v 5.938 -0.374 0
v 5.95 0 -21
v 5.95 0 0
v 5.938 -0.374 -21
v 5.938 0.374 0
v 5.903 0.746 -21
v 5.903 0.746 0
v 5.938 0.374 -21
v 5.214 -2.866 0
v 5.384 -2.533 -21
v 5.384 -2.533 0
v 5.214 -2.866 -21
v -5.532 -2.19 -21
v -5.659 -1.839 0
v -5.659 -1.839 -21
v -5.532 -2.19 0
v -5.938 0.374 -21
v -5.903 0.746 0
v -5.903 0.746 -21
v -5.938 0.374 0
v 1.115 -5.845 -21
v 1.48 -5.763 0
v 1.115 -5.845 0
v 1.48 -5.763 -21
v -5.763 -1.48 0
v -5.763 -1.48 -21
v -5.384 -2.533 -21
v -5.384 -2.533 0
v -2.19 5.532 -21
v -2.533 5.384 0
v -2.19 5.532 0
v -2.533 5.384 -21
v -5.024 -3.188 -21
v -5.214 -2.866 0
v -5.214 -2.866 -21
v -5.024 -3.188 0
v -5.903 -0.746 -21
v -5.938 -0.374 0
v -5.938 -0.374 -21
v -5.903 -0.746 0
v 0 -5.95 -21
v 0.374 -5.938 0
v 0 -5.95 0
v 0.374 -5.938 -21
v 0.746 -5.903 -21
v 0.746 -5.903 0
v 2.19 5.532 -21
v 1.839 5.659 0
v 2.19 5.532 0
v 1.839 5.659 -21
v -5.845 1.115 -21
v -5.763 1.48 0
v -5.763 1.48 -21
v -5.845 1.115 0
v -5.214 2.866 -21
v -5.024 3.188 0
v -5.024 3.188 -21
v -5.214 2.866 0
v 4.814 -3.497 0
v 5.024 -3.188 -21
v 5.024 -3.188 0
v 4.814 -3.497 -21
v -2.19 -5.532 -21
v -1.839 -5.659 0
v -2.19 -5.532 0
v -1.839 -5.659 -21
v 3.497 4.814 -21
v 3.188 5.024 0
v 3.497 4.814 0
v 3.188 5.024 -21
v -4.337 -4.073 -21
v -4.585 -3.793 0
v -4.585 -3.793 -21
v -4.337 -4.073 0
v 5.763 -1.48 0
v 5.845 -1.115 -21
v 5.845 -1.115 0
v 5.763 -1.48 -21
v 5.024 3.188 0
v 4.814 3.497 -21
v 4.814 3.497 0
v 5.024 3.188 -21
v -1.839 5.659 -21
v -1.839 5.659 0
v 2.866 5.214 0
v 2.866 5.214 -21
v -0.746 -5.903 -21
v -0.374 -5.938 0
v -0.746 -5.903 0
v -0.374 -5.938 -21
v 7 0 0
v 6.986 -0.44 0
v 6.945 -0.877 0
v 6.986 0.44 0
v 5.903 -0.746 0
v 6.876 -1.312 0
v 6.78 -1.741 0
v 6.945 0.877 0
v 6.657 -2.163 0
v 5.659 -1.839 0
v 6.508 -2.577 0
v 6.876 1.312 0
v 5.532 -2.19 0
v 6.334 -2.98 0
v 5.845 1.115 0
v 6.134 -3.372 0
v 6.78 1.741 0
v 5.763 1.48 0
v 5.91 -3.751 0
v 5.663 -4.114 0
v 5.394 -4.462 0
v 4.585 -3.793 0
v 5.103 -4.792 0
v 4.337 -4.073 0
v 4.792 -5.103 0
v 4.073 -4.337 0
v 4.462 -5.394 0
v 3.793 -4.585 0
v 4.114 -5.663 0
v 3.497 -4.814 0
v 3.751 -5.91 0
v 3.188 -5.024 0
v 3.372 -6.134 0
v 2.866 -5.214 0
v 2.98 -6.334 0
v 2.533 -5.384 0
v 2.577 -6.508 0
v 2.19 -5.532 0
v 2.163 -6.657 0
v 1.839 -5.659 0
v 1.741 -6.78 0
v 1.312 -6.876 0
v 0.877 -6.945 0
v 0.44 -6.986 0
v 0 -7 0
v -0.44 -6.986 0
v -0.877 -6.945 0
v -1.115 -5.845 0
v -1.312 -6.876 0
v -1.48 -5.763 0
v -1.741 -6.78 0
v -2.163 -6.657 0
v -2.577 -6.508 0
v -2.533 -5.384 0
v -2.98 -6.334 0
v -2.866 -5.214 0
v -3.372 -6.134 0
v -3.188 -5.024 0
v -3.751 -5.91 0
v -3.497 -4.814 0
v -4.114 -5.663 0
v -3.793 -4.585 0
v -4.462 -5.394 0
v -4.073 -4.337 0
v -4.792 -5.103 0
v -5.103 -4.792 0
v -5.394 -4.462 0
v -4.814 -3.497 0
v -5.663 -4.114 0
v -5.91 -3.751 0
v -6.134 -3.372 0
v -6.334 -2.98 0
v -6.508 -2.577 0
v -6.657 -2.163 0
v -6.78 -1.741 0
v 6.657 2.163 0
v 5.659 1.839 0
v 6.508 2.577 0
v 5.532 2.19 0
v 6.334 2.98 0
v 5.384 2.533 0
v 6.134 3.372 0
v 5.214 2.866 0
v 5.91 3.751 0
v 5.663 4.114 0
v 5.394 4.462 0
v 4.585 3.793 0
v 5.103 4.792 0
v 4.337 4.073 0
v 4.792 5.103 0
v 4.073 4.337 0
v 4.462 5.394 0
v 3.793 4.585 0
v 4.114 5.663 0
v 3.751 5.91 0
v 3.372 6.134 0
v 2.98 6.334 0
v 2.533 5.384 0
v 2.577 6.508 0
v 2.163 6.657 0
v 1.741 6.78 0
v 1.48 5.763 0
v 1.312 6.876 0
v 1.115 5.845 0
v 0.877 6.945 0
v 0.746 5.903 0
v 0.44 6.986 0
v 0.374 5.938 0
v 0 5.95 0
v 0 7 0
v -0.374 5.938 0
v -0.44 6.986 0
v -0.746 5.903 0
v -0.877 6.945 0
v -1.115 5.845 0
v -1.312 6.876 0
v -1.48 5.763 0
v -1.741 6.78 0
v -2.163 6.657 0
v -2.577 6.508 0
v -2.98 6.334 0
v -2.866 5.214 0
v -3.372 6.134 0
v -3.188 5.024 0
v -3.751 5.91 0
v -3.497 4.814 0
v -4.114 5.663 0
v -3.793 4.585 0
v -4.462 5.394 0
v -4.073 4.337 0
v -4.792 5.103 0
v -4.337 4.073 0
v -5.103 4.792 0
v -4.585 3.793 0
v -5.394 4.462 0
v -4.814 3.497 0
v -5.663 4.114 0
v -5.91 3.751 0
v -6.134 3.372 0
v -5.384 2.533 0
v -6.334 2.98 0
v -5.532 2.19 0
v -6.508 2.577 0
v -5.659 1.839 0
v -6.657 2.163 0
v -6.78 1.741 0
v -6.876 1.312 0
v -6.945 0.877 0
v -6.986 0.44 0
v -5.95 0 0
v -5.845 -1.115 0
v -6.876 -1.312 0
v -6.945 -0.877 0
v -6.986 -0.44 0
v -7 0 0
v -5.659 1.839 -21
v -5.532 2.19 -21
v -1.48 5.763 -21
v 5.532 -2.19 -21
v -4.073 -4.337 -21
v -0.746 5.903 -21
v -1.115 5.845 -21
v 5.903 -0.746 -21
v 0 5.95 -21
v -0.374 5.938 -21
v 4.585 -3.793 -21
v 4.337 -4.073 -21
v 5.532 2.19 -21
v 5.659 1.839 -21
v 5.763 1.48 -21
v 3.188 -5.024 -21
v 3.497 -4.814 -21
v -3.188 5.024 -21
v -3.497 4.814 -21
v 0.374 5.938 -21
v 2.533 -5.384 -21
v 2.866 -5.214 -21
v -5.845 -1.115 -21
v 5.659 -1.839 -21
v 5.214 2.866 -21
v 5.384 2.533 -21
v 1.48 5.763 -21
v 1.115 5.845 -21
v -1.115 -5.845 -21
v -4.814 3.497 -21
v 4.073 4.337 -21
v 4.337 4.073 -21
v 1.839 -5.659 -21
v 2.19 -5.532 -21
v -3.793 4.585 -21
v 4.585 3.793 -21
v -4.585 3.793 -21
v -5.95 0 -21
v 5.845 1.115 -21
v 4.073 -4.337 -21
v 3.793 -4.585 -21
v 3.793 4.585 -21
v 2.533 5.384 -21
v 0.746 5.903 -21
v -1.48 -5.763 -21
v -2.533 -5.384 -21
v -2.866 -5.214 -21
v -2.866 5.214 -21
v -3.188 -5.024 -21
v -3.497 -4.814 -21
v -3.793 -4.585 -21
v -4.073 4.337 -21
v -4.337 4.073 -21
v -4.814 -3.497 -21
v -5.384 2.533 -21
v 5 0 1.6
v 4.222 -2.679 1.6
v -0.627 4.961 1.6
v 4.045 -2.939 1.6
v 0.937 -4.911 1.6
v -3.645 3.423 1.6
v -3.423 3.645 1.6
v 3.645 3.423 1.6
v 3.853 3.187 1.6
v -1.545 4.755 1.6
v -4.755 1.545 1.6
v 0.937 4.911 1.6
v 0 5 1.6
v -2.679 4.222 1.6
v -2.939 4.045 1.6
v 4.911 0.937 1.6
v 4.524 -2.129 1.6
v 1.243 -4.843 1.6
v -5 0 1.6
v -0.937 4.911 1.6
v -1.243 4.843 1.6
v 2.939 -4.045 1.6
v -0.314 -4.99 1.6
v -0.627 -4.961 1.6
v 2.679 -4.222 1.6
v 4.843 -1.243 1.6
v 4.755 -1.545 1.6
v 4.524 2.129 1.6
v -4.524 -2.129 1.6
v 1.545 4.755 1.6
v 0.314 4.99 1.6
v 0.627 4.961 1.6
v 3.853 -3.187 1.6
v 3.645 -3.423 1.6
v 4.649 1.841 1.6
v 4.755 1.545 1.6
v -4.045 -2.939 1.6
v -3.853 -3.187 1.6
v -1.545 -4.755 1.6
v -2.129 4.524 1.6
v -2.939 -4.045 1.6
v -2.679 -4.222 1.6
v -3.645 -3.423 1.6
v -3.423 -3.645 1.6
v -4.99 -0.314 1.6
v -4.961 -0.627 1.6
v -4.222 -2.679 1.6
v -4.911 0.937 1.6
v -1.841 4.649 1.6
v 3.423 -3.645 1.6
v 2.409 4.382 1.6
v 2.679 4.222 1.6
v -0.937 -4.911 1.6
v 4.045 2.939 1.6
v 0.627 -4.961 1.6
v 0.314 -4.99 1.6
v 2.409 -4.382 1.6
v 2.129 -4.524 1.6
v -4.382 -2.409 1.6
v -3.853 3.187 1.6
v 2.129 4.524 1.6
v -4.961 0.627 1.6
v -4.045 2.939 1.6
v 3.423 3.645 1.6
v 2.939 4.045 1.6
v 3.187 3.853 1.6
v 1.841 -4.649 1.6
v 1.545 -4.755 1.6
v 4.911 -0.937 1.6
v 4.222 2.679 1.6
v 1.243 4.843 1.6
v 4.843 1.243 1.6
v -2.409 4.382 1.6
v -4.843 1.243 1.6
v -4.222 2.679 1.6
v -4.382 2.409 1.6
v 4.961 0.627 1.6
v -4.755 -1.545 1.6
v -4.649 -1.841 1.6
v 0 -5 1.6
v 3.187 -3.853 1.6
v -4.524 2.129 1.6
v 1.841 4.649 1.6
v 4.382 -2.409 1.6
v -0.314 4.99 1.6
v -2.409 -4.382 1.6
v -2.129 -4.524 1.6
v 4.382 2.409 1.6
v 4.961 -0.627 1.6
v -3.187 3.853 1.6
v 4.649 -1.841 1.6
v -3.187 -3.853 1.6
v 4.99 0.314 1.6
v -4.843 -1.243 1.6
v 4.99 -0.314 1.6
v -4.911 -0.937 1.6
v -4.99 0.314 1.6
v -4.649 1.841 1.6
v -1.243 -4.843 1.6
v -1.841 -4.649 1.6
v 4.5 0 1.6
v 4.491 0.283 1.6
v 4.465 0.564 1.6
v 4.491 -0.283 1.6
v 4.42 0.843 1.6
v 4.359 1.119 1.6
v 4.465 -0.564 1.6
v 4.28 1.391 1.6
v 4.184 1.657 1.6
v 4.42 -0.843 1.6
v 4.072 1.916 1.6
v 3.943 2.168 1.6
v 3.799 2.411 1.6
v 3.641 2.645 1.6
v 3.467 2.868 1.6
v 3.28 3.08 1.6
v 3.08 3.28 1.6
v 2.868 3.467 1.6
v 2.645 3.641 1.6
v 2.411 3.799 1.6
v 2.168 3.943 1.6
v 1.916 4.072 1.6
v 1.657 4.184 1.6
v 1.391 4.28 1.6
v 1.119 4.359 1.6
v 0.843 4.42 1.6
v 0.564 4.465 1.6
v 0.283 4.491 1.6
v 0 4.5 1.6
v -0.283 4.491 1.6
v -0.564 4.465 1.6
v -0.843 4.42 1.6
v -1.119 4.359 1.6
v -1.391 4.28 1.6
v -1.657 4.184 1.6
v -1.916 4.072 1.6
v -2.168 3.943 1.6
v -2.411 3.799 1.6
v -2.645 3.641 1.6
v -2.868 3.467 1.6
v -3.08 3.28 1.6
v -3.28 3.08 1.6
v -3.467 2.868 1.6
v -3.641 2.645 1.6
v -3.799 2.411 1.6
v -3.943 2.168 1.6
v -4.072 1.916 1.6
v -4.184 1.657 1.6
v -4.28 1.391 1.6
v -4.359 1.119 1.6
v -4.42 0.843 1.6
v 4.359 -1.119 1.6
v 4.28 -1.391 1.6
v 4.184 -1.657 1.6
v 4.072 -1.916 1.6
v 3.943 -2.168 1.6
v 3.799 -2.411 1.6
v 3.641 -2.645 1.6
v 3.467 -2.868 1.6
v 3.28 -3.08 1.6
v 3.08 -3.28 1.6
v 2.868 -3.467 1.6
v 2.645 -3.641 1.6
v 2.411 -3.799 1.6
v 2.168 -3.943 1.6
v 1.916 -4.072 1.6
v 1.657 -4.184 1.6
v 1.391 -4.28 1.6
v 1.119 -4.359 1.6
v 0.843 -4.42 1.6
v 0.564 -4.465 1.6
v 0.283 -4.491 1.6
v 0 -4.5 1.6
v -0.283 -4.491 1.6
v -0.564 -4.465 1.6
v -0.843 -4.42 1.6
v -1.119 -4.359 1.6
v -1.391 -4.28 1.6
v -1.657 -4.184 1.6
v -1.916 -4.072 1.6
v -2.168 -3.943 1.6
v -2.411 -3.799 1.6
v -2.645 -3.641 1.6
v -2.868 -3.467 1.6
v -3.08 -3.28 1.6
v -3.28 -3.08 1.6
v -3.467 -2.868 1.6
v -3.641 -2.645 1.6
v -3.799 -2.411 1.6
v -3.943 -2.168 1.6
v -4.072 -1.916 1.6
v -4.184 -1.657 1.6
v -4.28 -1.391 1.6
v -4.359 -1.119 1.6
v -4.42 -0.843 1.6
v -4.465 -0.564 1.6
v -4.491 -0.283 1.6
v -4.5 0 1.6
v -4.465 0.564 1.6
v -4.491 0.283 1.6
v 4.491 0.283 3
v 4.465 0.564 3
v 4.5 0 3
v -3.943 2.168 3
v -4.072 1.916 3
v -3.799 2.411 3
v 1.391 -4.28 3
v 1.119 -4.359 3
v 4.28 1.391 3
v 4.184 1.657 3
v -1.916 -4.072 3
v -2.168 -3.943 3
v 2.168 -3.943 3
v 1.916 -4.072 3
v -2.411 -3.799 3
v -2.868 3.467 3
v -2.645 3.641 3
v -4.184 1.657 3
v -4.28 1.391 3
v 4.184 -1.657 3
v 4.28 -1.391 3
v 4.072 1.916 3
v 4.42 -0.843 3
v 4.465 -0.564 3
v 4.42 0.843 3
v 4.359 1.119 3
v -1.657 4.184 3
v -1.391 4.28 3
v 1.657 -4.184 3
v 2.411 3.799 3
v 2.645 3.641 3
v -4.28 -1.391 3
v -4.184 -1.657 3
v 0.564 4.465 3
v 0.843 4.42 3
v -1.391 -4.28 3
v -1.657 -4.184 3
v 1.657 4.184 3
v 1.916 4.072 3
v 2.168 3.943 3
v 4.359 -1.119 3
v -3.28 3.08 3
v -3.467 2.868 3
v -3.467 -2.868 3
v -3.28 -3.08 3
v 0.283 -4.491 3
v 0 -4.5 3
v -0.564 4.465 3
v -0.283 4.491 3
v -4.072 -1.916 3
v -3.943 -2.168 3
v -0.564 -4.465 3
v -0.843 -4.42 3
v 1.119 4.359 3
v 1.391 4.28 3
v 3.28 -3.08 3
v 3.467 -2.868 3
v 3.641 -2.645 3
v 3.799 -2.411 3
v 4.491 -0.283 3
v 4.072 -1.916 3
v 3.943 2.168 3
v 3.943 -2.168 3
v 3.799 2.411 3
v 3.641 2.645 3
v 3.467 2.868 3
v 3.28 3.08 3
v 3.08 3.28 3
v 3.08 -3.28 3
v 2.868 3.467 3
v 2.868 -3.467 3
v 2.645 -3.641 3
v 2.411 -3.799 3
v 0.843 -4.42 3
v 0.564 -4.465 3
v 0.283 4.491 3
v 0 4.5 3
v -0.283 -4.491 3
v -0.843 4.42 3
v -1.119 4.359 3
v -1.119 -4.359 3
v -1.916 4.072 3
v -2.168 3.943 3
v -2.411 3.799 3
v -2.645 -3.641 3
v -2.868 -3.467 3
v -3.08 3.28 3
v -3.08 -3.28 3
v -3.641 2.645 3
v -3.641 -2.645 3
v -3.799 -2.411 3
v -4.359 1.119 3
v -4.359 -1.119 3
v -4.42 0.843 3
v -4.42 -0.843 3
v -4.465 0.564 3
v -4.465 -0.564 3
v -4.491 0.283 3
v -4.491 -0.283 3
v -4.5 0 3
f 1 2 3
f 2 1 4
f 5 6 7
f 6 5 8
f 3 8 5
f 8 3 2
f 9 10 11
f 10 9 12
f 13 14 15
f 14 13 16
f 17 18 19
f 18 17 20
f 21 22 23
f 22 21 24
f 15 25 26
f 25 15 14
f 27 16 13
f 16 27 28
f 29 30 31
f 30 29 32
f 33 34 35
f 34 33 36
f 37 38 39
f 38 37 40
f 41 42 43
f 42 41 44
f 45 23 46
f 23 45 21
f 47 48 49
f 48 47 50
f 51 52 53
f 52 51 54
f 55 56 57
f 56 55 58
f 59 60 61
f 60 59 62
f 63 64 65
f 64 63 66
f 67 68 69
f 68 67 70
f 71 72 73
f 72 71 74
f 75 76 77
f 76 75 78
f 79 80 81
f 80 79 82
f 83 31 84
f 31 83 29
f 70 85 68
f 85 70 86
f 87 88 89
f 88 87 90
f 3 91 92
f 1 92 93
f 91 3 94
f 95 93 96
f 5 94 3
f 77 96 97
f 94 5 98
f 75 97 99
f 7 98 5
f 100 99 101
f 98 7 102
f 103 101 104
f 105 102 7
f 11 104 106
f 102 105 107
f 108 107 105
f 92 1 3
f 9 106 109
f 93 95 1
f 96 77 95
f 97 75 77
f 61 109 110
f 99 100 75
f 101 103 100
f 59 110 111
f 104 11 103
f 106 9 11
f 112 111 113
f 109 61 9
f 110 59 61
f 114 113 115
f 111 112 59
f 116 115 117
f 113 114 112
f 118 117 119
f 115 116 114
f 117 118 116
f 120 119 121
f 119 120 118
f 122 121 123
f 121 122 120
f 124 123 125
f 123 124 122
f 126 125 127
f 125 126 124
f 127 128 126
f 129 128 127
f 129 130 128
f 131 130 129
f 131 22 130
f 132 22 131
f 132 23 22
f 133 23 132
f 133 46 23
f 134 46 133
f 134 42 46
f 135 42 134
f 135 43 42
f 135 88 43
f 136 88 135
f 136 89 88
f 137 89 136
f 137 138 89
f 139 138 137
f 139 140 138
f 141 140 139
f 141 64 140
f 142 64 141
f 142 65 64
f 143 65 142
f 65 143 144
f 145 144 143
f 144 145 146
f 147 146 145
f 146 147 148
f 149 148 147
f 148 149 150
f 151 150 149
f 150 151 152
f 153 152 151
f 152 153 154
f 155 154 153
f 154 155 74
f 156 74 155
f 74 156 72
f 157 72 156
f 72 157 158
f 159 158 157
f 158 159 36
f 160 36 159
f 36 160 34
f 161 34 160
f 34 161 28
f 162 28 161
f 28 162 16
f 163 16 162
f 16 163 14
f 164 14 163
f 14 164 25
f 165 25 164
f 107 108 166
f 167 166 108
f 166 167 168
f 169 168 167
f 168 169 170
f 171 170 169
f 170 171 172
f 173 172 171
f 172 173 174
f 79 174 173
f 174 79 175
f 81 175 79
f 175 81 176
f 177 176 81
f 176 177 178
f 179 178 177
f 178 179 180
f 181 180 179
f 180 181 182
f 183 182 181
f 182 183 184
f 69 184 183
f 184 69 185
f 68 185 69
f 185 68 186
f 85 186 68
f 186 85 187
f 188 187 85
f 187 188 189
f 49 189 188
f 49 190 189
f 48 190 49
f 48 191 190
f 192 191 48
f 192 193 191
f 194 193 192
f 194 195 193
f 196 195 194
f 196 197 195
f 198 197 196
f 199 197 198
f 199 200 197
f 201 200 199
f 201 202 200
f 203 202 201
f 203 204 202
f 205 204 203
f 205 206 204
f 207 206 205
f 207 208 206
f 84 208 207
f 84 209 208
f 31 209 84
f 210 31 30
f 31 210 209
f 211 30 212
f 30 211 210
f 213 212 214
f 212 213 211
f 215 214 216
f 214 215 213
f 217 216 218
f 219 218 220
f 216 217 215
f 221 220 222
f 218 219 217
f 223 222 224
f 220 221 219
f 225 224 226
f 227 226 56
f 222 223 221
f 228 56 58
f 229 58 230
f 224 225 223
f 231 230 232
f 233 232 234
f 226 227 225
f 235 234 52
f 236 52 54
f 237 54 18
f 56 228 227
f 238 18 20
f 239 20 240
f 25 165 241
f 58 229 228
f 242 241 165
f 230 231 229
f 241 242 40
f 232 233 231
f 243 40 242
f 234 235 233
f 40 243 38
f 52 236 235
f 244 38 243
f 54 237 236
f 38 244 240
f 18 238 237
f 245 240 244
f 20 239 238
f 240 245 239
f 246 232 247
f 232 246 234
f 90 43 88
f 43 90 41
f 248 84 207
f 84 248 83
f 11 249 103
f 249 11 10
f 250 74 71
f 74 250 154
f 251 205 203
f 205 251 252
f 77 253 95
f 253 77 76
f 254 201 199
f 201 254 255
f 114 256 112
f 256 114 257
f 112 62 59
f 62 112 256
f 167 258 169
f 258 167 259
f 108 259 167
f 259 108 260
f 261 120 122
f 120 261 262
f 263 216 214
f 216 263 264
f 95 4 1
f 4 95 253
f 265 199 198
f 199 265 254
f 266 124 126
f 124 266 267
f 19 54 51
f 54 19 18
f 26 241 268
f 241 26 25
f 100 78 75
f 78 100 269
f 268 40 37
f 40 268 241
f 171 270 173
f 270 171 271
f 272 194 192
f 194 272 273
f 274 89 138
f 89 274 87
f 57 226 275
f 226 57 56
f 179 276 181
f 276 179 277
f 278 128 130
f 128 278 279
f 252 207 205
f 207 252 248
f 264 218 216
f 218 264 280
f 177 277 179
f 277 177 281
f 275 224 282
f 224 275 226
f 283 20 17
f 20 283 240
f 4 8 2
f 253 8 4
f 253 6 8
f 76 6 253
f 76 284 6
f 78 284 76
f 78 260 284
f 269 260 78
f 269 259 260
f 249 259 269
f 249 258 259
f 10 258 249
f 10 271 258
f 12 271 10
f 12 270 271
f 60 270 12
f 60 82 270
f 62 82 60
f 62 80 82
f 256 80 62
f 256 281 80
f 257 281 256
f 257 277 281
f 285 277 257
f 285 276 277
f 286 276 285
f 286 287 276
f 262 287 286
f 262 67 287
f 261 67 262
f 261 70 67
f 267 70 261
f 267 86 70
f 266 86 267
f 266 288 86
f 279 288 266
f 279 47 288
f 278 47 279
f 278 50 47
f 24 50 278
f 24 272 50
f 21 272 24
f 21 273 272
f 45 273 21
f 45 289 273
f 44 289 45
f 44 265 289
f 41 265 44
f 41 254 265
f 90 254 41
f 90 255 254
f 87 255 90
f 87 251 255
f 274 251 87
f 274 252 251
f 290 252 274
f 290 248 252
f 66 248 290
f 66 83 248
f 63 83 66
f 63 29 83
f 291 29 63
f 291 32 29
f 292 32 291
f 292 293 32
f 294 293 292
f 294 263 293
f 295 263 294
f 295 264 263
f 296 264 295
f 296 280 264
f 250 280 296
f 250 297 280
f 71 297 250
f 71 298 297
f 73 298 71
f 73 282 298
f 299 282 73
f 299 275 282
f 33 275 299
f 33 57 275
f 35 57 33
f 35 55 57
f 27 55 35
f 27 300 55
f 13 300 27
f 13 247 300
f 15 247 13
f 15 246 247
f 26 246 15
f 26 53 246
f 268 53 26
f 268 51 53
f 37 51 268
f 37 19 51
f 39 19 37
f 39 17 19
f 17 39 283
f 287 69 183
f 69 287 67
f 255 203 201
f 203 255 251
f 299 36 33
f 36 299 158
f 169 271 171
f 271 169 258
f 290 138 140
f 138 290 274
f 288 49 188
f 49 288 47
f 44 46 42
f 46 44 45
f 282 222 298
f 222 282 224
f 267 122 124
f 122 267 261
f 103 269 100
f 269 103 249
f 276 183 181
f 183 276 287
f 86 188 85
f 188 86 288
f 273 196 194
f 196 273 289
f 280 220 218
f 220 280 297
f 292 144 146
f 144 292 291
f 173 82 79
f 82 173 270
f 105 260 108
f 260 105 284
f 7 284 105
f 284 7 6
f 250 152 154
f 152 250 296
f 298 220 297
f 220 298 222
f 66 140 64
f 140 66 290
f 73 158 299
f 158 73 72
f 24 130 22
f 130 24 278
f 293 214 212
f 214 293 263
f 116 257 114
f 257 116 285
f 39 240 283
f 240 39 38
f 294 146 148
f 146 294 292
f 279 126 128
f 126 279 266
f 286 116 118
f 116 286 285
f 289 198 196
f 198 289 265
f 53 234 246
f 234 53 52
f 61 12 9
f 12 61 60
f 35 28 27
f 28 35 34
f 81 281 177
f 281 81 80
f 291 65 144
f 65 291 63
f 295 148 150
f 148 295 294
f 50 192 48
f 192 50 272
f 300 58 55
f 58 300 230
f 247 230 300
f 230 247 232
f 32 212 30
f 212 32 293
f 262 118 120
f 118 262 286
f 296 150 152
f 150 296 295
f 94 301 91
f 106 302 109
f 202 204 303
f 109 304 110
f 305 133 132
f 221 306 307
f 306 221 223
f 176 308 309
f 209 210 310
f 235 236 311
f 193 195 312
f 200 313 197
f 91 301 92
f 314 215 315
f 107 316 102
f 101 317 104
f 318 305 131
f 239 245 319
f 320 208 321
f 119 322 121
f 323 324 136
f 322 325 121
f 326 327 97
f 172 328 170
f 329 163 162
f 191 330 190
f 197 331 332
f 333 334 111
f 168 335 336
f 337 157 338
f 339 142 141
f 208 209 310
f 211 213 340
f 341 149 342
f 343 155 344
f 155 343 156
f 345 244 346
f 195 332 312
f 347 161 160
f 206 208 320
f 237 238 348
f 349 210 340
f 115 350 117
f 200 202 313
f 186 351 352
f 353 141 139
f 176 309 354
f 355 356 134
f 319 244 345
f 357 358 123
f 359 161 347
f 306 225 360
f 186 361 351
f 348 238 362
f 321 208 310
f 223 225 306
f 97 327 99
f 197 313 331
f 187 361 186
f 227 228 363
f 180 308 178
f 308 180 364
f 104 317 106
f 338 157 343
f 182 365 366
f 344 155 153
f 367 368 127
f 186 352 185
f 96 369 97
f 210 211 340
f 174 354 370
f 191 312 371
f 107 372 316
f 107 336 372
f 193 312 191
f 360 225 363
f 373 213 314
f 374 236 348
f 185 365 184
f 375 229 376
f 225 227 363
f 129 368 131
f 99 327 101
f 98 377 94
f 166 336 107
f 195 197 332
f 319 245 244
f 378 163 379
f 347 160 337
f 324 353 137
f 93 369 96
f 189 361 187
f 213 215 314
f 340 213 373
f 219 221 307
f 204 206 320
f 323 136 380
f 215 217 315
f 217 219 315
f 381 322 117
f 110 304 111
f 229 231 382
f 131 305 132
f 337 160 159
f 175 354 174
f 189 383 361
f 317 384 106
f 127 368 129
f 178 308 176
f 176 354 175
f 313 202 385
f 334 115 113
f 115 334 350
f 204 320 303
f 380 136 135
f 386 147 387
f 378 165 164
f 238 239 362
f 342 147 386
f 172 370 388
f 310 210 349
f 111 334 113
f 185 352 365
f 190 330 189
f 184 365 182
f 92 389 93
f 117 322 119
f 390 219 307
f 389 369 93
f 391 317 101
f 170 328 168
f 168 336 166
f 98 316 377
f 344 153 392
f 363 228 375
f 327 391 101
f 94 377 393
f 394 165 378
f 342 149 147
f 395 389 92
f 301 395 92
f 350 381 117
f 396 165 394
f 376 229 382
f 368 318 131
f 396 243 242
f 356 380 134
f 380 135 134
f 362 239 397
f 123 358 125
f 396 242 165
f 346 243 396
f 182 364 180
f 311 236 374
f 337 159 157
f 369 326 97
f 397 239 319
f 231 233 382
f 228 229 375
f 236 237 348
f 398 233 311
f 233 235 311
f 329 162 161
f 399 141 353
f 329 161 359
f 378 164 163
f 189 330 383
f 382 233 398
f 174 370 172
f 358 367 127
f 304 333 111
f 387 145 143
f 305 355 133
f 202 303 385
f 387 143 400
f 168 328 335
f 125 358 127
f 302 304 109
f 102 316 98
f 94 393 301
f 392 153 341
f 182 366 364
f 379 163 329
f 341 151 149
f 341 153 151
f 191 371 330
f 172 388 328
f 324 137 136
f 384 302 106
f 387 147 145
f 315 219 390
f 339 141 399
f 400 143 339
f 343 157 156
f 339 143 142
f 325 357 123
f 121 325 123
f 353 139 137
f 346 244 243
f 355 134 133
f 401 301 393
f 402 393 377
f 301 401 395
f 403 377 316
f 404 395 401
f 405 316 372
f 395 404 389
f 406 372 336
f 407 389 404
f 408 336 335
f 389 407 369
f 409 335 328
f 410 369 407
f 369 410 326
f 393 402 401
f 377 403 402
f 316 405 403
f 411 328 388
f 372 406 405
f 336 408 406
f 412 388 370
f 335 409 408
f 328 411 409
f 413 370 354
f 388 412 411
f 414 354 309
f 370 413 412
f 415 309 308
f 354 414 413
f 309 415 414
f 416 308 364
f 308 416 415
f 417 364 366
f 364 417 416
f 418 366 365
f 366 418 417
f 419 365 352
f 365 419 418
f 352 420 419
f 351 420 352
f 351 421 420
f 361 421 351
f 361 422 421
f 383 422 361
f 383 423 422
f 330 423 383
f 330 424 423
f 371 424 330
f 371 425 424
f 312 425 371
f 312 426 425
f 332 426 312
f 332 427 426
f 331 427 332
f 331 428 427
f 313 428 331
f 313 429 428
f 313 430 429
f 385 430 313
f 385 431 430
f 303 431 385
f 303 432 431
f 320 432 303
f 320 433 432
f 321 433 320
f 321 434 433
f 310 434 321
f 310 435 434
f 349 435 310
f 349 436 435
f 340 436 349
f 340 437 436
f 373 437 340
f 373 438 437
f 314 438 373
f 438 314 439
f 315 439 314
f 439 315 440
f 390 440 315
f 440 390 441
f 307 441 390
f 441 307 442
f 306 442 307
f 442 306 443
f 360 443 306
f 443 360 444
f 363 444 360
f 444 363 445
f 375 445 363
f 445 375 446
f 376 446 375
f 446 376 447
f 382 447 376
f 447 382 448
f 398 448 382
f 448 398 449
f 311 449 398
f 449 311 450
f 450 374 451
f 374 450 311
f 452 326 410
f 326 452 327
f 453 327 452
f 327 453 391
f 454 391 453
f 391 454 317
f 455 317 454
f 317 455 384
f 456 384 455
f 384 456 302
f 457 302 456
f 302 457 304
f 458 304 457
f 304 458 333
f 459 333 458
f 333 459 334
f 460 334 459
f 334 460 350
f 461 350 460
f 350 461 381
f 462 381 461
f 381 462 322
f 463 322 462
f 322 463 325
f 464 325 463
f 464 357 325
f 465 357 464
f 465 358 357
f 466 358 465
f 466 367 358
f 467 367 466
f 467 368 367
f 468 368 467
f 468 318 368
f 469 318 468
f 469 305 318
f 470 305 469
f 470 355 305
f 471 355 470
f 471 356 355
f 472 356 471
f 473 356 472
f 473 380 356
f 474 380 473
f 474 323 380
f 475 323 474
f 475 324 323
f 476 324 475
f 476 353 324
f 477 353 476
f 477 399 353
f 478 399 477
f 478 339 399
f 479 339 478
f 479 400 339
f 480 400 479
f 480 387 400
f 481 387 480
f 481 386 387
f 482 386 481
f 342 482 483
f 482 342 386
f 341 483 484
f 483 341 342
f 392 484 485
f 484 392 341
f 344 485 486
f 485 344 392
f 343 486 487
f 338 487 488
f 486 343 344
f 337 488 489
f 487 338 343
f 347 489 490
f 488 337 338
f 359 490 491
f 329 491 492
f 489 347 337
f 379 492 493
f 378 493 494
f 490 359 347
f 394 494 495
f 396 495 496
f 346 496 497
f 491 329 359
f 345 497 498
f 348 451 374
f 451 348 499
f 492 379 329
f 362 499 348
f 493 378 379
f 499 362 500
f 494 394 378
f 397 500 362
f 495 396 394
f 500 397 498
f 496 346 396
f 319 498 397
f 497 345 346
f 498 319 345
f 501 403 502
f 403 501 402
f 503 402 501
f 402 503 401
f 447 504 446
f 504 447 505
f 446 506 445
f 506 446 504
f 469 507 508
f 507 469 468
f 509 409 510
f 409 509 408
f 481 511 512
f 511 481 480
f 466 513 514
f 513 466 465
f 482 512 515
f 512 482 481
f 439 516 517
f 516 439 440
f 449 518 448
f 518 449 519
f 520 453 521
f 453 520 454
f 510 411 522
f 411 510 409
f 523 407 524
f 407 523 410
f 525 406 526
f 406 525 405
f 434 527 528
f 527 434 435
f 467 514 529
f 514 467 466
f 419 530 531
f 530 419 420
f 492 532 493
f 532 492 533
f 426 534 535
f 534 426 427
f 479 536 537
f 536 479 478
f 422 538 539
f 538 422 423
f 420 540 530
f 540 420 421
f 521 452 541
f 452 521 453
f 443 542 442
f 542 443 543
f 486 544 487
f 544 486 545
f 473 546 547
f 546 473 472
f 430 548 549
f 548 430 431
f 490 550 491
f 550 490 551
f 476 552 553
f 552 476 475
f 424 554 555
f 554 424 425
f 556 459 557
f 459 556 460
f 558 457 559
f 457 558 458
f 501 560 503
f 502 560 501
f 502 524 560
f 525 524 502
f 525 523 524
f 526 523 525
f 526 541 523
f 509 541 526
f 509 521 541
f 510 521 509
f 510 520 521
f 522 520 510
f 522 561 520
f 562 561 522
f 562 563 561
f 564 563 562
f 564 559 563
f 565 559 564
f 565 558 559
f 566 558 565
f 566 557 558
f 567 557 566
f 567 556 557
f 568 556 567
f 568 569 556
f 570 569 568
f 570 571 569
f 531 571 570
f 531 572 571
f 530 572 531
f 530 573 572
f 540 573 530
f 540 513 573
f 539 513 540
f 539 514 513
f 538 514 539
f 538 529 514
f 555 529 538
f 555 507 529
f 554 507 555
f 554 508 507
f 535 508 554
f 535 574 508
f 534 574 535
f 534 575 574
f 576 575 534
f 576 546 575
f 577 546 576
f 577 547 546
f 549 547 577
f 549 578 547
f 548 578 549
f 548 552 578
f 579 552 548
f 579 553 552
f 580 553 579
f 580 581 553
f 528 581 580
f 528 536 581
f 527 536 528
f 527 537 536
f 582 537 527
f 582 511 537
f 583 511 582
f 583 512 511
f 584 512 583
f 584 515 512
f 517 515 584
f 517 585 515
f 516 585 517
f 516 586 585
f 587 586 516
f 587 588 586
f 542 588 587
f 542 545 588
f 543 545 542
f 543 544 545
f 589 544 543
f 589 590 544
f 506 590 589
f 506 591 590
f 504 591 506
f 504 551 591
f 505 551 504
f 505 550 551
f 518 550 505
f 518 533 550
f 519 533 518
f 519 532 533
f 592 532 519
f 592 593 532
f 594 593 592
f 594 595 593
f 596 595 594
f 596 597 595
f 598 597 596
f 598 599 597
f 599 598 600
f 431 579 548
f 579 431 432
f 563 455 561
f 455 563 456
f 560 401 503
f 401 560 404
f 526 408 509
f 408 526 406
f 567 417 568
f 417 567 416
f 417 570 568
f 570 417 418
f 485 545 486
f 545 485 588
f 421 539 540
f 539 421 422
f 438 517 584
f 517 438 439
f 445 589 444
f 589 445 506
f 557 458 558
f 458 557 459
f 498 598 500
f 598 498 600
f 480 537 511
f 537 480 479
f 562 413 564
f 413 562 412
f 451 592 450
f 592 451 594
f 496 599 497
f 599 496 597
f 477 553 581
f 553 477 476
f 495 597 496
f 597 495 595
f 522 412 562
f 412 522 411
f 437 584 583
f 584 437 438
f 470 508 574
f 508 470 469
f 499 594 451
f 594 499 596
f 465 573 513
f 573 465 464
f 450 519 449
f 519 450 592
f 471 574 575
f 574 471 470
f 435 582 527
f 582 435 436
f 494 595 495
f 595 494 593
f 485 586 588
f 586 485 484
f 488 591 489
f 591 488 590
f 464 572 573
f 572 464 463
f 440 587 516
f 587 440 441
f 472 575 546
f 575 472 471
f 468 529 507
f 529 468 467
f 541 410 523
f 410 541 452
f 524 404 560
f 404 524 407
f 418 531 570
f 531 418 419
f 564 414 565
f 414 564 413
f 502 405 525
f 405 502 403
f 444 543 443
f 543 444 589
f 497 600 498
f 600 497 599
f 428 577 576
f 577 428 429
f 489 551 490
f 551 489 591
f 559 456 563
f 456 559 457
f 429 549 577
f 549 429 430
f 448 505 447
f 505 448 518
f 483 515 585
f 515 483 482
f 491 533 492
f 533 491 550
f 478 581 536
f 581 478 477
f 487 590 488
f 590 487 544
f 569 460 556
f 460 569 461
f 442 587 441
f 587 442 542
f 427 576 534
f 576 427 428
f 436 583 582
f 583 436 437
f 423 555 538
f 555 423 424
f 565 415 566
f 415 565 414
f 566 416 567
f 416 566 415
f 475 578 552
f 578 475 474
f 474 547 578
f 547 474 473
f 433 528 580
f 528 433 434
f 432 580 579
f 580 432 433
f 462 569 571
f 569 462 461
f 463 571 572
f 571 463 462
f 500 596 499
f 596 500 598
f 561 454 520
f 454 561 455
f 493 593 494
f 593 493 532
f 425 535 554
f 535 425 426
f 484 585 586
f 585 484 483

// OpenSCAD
/**
 * onOffButton
 * @name onOffButton
 * @description Simple On Off button
 * @type asset
 * @parent 
 */
module onOffButton(
    $fn = 100
) {

    bottom_part_z_size = 6 + 12 + (6 / 2);
    bottom_part_diameter = 11.90; // M12 * 0.75

    support_z_size = 1.6;
    support_diameter_1 = 14;
    support_diameter_2 = 9 + 1;

    button_z_size = 3;
    button_diameter = 9;

    translate([0, 0, -bottom_part_z_size])
        cylinder(h=bottom_part_z_size, d=bottom_part_diameter, $fn = $fn);

    cylinder(
        h = support_z_size,
        d1 = support_diameter_1,
        d2 = support_diameter_2,
        $fn = $fn
    );

    cylinder(
        h = button_z_size,
        d = button_diameter,
        $fn = $fn
    );
}

onOffButton();
